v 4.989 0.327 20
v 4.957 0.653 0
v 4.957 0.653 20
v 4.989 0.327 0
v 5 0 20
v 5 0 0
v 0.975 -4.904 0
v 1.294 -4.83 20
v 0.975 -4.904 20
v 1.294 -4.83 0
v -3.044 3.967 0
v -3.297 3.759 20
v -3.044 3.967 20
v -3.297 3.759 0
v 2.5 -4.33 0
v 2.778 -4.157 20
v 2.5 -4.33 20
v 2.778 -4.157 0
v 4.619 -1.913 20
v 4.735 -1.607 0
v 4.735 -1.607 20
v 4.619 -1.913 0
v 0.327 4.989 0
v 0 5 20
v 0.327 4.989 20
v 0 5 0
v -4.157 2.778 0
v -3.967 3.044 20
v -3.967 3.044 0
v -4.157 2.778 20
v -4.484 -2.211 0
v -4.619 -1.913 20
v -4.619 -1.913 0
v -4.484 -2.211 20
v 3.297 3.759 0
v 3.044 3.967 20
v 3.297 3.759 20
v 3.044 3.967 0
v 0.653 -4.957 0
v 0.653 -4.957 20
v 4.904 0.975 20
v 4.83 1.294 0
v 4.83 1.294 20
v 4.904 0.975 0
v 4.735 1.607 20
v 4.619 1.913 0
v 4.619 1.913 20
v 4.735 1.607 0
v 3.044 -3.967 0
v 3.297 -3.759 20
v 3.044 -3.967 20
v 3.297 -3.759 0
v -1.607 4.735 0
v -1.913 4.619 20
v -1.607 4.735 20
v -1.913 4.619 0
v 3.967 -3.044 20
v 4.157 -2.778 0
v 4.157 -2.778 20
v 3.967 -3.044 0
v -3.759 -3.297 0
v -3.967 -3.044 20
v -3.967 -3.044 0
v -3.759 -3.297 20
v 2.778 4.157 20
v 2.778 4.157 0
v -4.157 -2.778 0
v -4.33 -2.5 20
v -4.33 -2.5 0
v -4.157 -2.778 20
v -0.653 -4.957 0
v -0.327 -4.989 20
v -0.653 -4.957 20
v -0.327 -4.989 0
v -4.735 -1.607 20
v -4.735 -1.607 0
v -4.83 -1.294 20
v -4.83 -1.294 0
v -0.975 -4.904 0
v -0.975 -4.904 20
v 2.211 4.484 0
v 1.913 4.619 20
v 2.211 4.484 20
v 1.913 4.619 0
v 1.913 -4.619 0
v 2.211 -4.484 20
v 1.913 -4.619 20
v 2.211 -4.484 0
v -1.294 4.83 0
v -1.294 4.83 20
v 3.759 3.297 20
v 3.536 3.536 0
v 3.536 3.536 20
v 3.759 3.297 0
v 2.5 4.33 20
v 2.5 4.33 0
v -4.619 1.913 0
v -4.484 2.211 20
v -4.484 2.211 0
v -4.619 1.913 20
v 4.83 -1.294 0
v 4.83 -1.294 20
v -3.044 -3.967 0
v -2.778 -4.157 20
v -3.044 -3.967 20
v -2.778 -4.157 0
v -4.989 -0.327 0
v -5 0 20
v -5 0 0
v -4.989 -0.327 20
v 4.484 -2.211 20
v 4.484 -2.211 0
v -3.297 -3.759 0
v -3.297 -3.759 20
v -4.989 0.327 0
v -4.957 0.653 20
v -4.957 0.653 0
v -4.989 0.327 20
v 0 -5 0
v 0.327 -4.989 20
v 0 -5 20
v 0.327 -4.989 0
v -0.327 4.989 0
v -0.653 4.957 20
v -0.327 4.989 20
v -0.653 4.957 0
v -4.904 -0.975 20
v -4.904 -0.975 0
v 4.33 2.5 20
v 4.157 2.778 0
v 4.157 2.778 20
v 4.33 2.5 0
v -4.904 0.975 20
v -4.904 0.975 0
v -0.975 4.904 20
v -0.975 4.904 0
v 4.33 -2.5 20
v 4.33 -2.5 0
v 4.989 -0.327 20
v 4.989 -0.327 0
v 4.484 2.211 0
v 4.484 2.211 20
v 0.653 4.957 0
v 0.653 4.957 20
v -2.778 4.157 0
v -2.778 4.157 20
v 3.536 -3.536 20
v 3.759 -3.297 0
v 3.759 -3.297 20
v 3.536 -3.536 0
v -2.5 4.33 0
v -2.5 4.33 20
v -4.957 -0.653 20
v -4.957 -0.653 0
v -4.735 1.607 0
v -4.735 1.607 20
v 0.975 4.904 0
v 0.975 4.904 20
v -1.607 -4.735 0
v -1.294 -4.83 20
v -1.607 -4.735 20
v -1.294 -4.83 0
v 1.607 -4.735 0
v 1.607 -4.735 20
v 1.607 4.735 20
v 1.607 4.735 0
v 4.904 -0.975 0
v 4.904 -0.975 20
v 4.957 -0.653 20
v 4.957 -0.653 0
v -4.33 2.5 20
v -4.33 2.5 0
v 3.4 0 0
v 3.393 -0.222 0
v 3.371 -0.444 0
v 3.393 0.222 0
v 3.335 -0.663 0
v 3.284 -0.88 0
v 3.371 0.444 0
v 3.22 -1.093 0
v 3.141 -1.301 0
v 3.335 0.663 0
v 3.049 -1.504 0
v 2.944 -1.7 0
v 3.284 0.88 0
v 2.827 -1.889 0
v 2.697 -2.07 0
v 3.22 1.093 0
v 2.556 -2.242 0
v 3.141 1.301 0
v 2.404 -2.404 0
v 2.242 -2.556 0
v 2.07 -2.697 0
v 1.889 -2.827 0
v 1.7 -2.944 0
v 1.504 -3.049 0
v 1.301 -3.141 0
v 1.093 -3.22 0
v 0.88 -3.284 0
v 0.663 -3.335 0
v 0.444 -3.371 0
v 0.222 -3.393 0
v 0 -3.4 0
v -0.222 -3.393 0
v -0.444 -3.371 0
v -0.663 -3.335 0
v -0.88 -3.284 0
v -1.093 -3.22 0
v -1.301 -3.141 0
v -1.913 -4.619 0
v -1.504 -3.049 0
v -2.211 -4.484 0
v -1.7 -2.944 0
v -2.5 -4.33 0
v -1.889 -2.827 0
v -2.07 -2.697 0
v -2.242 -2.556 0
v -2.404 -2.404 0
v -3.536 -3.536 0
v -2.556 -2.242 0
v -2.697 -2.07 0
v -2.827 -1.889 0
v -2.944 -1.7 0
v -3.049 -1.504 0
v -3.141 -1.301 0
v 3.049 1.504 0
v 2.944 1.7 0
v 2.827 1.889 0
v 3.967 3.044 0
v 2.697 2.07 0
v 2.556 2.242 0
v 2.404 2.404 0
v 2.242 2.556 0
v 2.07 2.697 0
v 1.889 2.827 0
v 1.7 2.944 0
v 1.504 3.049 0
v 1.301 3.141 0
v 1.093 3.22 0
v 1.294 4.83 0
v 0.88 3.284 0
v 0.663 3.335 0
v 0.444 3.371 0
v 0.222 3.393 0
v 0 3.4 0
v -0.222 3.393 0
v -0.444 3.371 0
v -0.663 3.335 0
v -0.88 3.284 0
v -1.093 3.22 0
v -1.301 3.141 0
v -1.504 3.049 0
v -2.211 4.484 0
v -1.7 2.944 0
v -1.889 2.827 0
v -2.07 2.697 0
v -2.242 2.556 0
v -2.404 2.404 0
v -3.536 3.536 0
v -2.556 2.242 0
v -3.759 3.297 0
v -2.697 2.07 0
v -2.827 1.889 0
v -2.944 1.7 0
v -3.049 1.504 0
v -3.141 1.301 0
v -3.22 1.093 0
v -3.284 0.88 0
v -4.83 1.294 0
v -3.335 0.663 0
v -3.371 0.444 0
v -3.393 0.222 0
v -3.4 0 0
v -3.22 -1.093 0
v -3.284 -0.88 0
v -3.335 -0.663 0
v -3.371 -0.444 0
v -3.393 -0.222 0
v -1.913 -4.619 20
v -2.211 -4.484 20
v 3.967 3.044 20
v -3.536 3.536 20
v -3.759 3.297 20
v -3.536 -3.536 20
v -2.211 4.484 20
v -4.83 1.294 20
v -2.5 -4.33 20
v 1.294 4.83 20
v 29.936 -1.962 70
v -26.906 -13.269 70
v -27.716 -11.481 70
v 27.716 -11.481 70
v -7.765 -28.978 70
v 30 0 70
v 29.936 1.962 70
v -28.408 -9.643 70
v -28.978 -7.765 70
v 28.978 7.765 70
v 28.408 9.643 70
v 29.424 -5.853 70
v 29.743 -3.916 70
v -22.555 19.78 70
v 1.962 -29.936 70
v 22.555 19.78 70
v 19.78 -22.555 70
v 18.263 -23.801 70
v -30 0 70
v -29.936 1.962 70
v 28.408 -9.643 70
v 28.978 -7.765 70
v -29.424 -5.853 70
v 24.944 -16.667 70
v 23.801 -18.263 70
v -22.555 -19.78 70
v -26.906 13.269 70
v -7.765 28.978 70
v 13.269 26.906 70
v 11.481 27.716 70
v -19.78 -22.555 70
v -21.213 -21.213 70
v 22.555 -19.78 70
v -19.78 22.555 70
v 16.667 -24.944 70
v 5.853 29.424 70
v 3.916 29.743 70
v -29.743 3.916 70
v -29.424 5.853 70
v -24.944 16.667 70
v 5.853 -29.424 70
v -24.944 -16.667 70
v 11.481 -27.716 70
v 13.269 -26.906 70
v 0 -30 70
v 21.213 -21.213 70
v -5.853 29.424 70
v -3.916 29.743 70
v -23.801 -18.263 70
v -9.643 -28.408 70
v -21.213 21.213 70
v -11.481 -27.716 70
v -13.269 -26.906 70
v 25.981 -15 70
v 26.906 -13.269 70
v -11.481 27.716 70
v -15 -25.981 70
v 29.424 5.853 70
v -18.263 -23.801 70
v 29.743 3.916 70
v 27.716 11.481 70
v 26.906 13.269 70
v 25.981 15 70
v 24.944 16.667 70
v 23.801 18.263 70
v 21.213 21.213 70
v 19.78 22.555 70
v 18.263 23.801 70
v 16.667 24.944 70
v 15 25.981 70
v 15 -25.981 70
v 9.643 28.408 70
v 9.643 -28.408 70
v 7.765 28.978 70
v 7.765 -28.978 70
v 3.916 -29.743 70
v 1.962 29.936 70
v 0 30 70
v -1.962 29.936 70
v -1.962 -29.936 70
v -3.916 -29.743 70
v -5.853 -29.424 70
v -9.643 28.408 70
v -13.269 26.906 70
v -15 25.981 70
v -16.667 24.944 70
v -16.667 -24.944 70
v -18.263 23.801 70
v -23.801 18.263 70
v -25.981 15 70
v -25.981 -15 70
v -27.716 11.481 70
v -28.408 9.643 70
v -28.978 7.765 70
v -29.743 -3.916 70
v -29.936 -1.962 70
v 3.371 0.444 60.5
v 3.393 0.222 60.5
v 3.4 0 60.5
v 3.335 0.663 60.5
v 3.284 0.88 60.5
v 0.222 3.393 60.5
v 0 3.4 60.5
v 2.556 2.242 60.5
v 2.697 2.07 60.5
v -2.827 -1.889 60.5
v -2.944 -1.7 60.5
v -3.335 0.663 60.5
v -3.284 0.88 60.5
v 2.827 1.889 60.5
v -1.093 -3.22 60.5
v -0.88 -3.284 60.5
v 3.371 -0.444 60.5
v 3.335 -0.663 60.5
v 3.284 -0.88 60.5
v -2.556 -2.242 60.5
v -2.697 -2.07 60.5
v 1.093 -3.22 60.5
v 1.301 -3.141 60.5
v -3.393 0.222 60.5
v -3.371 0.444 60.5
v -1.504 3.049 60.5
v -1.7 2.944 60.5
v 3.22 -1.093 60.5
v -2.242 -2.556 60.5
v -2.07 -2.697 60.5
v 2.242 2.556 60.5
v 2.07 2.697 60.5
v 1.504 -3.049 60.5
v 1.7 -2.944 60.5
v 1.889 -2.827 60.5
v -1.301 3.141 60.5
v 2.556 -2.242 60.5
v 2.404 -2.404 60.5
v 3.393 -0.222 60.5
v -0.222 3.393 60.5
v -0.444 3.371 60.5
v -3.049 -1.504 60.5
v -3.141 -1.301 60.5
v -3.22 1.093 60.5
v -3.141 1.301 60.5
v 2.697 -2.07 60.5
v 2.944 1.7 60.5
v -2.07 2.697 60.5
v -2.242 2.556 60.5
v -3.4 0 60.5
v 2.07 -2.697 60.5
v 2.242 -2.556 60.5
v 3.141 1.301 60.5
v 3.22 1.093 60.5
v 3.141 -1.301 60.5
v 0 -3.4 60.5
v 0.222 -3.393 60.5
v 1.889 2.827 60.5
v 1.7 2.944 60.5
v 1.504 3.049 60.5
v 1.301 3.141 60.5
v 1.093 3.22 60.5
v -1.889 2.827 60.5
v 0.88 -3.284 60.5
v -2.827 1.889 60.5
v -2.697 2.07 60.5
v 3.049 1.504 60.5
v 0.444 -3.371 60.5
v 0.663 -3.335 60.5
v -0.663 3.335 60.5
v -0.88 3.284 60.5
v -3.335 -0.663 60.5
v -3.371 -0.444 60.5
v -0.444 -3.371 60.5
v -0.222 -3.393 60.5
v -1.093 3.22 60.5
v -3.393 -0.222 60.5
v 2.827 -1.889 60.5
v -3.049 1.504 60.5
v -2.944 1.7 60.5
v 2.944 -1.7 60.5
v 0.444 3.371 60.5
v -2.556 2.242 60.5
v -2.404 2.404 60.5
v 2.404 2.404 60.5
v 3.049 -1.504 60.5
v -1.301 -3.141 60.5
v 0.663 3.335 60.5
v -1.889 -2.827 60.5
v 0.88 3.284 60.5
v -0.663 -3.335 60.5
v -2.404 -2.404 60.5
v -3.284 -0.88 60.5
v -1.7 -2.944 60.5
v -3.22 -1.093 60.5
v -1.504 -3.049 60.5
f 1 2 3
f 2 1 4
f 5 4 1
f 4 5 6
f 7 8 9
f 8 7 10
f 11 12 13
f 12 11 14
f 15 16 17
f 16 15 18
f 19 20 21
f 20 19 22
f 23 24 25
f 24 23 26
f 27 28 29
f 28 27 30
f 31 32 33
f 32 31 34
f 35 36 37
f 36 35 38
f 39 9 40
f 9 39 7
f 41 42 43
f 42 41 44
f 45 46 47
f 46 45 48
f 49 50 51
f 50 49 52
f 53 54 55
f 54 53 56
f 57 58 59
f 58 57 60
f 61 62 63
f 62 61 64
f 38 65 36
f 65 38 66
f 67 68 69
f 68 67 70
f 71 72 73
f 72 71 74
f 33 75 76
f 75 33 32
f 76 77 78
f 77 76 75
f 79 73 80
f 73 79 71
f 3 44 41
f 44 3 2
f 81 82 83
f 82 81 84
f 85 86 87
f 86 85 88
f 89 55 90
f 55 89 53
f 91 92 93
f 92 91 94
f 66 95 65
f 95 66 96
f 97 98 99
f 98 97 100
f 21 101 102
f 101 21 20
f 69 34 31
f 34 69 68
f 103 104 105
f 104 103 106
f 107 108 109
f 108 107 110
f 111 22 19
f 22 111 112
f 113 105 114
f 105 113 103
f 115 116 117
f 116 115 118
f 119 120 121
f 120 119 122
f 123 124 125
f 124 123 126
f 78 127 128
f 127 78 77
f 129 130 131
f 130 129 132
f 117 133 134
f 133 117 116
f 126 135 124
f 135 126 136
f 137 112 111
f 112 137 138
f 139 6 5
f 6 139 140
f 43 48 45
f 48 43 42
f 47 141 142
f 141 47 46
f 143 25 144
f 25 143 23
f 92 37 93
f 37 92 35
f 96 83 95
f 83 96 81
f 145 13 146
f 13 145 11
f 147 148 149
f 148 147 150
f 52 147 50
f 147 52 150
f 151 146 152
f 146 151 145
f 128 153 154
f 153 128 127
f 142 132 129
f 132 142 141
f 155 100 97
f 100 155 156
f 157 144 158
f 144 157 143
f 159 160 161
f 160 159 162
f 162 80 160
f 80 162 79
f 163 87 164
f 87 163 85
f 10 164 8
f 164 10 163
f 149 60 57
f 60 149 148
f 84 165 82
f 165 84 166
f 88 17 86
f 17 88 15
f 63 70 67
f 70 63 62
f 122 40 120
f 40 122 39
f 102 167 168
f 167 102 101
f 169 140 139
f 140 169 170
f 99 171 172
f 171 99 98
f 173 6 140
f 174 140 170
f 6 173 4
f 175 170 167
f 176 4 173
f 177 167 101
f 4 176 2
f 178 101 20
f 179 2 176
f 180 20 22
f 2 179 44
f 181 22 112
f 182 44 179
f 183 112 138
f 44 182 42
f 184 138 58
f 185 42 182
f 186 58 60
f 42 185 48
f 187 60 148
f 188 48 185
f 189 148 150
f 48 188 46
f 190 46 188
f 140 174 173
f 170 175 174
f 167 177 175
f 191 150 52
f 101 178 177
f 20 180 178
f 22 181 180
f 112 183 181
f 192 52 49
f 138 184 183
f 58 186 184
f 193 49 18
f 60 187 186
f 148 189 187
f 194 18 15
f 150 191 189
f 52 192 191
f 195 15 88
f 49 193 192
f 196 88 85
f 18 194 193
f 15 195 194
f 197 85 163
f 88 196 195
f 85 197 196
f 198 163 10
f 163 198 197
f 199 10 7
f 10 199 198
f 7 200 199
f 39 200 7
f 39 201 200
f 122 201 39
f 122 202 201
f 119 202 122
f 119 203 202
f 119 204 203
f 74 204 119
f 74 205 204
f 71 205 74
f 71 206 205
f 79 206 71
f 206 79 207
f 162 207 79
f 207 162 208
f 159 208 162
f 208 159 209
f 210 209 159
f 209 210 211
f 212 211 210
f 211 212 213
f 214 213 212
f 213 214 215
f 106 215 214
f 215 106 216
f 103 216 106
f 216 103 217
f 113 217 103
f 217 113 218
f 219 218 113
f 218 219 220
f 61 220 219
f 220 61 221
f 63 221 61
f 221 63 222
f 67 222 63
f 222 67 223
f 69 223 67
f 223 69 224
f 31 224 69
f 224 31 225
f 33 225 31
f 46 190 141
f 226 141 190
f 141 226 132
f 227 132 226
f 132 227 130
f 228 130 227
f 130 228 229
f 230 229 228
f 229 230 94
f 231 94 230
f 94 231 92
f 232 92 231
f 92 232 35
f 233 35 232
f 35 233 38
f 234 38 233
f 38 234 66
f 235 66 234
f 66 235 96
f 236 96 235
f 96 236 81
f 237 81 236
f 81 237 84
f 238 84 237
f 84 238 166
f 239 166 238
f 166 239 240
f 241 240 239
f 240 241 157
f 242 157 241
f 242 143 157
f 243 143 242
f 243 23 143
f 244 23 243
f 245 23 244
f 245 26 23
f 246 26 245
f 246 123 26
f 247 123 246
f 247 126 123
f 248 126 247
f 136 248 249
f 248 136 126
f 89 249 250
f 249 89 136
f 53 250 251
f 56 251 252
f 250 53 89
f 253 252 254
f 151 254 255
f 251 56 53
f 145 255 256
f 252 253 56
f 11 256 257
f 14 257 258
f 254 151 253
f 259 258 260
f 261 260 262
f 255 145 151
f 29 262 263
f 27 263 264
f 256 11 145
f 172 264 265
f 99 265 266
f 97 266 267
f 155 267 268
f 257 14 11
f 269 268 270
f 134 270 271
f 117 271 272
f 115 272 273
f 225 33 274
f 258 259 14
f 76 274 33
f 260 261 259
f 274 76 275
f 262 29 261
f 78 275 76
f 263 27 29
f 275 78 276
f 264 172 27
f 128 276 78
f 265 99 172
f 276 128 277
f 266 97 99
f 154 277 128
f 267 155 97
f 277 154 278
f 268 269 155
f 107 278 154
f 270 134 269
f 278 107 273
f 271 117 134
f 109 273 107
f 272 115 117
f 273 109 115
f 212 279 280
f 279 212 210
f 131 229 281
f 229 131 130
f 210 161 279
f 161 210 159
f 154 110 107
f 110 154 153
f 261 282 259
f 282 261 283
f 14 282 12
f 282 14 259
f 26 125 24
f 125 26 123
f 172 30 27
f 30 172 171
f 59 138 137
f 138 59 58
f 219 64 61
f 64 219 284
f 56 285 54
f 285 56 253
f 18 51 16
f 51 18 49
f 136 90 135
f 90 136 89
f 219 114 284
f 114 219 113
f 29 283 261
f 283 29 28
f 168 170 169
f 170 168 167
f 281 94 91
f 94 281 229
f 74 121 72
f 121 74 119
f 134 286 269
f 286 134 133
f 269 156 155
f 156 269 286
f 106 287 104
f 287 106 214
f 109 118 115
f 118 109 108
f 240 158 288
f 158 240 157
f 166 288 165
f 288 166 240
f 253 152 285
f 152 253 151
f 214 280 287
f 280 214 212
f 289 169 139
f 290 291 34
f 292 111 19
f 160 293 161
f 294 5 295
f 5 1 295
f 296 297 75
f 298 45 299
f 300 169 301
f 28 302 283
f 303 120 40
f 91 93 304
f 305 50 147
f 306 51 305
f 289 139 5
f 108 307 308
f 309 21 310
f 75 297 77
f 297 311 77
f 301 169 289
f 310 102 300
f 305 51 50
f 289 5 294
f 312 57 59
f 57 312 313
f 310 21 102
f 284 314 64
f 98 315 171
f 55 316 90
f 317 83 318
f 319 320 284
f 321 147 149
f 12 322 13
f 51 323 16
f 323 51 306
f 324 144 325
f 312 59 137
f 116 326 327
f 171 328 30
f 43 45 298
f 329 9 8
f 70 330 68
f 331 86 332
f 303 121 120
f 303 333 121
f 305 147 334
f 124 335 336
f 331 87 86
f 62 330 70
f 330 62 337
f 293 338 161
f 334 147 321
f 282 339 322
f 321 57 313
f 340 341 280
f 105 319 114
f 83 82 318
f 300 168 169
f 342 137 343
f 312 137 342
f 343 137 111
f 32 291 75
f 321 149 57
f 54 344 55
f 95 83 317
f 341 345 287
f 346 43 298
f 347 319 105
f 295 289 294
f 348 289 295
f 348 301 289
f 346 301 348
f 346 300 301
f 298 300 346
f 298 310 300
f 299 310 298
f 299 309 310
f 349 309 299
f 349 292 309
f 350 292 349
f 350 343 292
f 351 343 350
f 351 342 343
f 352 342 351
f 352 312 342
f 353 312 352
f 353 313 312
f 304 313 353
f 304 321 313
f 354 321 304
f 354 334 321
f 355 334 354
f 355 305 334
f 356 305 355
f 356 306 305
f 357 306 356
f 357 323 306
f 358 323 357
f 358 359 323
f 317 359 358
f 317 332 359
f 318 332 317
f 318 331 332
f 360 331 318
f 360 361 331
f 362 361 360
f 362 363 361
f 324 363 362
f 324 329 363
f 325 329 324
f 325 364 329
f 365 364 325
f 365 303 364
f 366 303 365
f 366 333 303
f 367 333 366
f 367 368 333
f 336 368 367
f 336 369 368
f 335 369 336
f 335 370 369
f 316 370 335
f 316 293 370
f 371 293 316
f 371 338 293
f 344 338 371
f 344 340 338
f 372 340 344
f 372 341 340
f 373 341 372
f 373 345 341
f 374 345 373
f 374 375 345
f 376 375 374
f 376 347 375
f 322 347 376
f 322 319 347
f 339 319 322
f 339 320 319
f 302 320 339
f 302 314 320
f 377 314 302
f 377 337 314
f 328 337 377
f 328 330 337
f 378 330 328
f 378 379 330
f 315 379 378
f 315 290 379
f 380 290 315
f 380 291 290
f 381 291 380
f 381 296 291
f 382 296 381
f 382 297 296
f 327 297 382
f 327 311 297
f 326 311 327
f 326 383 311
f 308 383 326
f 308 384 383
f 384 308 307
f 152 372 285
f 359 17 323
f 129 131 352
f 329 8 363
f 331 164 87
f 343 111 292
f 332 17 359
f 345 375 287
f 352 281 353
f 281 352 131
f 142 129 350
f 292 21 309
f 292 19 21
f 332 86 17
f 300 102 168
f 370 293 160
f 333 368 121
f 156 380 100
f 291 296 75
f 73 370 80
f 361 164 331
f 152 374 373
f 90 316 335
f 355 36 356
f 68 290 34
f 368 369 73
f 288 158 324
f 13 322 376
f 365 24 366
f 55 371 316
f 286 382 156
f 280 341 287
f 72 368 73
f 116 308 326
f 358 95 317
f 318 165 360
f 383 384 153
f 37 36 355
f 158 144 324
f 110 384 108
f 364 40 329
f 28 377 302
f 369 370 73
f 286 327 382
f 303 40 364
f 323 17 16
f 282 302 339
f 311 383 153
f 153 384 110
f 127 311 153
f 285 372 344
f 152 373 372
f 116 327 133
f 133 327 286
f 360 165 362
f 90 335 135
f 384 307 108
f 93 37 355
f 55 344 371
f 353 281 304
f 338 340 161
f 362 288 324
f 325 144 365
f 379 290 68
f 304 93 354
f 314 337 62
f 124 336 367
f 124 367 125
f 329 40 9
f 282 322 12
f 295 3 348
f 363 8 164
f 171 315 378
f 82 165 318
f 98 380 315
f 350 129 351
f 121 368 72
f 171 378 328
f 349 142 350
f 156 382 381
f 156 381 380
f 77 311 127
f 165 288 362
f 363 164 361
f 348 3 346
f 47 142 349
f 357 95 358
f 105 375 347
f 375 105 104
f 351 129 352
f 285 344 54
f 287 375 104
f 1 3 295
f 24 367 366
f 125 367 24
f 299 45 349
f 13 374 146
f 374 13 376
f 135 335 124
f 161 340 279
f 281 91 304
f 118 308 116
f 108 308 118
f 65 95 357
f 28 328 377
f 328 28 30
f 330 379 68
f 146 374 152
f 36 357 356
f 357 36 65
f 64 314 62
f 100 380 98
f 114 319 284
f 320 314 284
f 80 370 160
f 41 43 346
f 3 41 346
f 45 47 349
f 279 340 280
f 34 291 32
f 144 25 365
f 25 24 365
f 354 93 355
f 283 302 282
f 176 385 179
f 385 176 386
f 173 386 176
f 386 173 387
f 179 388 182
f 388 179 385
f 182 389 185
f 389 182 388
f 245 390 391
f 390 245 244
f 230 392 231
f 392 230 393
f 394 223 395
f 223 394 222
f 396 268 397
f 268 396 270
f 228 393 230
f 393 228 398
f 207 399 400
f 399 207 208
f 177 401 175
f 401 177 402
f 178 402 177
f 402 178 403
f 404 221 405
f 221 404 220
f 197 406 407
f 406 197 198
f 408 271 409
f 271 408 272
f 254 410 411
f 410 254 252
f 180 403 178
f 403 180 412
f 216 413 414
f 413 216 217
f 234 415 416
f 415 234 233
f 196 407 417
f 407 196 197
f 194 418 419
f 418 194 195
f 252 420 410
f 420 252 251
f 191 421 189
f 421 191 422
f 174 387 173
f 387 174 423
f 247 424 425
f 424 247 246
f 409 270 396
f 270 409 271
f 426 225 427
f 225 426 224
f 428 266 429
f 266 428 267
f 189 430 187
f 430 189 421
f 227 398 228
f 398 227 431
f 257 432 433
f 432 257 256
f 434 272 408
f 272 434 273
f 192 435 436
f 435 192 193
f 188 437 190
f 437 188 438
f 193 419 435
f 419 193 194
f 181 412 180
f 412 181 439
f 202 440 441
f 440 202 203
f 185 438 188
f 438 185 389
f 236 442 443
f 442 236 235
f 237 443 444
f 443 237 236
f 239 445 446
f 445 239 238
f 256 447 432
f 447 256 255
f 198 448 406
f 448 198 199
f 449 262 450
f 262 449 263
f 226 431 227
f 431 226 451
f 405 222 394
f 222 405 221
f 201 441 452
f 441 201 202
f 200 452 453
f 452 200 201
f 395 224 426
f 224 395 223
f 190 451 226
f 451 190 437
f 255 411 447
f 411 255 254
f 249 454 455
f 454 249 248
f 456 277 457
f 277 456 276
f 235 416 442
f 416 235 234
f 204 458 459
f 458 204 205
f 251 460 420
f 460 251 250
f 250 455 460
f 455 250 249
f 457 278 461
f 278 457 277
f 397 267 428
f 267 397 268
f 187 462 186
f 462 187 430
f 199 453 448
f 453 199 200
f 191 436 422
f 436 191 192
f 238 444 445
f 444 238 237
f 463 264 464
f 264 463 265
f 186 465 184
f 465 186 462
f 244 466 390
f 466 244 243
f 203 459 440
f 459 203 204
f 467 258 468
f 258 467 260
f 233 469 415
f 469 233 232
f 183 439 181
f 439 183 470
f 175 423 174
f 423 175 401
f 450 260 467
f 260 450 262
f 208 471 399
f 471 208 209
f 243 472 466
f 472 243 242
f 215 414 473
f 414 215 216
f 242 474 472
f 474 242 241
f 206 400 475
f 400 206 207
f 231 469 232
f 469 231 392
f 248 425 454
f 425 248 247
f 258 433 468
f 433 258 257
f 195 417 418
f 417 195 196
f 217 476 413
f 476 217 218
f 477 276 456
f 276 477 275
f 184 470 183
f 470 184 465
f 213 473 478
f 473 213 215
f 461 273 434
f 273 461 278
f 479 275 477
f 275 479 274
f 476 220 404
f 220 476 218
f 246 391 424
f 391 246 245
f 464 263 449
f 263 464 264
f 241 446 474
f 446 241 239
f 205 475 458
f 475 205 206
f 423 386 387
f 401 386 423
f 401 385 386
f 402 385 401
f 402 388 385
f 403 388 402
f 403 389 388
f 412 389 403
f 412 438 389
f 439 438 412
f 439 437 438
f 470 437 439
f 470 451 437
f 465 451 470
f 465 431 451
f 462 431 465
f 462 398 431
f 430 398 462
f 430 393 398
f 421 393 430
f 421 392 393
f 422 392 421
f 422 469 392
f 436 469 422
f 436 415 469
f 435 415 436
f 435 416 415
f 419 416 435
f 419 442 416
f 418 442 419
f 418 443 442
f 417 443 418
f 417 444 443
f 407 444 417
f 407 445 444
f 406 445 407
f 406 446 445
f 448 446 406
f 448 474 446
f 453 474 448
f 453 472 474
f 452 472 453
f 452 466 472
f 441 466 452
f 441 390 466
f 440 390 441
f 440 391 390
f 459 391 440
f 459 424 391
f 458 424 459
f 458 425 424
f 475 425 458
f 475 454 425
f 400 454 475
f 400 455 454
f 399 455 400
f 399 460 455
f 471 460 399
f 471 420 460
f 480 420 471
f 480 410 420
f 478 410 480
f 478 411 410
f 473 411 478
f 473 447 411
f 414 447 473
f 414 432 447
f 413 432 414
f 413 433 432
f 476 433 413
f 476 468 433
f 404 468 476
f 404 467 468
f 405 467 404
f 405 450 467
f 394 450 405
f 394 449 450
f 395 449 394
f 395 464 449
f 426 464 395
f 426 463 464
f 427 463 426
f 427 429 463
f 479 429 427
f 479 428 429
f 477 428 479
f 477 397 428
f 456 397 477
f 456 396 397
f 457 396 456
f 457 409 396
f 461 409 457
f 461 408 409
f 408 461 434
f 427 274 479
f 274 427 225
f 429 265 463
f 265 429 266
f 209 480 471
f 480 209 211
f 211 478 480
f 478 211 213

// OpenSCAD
// Small lab funnel, printed upright: spout at the bottom, wide rim at the top
// All dimensions in millimetres

// ---- Parameters ----
spout_od      = 10;    // outer diameter of straight spout
spout_h       = 20;    // spout height (z = 0 to 20)
cone_od_top   = 60;    // outer diameter of cone rim (z = 50)
cone_od_bot   = 10;    // cone outer diameter at z = 20
wall          = 1.6;   // wall thickness everywhere
eps           = 0.5;   // overshoot for clean boolean cuts

$fn = 96;

// ---- Derived ----
bore = spout_od - 2 * wall;   // 6.8 mm bore in the spout

// ---- Model ----
difference() {
    union() {
        // Straight spout from z = 0 to z = 20
        cylinder(h = spout_h, d = spout_od);

        // Cone from z = 20 to z = 50
        translate([0, 0, spout_h])
            cylinder(h = cone_od_top - cone_od_bot,
                     d1 = cone_od_bot,
                     d2 = cone_od_top);
    }

    // Through-bore: starts below z = 0, runs through the spout and cone
    translate([0, 0, -eps])
        cylinder(h = cone_od_top + 2 * eps, d = bore);
}
